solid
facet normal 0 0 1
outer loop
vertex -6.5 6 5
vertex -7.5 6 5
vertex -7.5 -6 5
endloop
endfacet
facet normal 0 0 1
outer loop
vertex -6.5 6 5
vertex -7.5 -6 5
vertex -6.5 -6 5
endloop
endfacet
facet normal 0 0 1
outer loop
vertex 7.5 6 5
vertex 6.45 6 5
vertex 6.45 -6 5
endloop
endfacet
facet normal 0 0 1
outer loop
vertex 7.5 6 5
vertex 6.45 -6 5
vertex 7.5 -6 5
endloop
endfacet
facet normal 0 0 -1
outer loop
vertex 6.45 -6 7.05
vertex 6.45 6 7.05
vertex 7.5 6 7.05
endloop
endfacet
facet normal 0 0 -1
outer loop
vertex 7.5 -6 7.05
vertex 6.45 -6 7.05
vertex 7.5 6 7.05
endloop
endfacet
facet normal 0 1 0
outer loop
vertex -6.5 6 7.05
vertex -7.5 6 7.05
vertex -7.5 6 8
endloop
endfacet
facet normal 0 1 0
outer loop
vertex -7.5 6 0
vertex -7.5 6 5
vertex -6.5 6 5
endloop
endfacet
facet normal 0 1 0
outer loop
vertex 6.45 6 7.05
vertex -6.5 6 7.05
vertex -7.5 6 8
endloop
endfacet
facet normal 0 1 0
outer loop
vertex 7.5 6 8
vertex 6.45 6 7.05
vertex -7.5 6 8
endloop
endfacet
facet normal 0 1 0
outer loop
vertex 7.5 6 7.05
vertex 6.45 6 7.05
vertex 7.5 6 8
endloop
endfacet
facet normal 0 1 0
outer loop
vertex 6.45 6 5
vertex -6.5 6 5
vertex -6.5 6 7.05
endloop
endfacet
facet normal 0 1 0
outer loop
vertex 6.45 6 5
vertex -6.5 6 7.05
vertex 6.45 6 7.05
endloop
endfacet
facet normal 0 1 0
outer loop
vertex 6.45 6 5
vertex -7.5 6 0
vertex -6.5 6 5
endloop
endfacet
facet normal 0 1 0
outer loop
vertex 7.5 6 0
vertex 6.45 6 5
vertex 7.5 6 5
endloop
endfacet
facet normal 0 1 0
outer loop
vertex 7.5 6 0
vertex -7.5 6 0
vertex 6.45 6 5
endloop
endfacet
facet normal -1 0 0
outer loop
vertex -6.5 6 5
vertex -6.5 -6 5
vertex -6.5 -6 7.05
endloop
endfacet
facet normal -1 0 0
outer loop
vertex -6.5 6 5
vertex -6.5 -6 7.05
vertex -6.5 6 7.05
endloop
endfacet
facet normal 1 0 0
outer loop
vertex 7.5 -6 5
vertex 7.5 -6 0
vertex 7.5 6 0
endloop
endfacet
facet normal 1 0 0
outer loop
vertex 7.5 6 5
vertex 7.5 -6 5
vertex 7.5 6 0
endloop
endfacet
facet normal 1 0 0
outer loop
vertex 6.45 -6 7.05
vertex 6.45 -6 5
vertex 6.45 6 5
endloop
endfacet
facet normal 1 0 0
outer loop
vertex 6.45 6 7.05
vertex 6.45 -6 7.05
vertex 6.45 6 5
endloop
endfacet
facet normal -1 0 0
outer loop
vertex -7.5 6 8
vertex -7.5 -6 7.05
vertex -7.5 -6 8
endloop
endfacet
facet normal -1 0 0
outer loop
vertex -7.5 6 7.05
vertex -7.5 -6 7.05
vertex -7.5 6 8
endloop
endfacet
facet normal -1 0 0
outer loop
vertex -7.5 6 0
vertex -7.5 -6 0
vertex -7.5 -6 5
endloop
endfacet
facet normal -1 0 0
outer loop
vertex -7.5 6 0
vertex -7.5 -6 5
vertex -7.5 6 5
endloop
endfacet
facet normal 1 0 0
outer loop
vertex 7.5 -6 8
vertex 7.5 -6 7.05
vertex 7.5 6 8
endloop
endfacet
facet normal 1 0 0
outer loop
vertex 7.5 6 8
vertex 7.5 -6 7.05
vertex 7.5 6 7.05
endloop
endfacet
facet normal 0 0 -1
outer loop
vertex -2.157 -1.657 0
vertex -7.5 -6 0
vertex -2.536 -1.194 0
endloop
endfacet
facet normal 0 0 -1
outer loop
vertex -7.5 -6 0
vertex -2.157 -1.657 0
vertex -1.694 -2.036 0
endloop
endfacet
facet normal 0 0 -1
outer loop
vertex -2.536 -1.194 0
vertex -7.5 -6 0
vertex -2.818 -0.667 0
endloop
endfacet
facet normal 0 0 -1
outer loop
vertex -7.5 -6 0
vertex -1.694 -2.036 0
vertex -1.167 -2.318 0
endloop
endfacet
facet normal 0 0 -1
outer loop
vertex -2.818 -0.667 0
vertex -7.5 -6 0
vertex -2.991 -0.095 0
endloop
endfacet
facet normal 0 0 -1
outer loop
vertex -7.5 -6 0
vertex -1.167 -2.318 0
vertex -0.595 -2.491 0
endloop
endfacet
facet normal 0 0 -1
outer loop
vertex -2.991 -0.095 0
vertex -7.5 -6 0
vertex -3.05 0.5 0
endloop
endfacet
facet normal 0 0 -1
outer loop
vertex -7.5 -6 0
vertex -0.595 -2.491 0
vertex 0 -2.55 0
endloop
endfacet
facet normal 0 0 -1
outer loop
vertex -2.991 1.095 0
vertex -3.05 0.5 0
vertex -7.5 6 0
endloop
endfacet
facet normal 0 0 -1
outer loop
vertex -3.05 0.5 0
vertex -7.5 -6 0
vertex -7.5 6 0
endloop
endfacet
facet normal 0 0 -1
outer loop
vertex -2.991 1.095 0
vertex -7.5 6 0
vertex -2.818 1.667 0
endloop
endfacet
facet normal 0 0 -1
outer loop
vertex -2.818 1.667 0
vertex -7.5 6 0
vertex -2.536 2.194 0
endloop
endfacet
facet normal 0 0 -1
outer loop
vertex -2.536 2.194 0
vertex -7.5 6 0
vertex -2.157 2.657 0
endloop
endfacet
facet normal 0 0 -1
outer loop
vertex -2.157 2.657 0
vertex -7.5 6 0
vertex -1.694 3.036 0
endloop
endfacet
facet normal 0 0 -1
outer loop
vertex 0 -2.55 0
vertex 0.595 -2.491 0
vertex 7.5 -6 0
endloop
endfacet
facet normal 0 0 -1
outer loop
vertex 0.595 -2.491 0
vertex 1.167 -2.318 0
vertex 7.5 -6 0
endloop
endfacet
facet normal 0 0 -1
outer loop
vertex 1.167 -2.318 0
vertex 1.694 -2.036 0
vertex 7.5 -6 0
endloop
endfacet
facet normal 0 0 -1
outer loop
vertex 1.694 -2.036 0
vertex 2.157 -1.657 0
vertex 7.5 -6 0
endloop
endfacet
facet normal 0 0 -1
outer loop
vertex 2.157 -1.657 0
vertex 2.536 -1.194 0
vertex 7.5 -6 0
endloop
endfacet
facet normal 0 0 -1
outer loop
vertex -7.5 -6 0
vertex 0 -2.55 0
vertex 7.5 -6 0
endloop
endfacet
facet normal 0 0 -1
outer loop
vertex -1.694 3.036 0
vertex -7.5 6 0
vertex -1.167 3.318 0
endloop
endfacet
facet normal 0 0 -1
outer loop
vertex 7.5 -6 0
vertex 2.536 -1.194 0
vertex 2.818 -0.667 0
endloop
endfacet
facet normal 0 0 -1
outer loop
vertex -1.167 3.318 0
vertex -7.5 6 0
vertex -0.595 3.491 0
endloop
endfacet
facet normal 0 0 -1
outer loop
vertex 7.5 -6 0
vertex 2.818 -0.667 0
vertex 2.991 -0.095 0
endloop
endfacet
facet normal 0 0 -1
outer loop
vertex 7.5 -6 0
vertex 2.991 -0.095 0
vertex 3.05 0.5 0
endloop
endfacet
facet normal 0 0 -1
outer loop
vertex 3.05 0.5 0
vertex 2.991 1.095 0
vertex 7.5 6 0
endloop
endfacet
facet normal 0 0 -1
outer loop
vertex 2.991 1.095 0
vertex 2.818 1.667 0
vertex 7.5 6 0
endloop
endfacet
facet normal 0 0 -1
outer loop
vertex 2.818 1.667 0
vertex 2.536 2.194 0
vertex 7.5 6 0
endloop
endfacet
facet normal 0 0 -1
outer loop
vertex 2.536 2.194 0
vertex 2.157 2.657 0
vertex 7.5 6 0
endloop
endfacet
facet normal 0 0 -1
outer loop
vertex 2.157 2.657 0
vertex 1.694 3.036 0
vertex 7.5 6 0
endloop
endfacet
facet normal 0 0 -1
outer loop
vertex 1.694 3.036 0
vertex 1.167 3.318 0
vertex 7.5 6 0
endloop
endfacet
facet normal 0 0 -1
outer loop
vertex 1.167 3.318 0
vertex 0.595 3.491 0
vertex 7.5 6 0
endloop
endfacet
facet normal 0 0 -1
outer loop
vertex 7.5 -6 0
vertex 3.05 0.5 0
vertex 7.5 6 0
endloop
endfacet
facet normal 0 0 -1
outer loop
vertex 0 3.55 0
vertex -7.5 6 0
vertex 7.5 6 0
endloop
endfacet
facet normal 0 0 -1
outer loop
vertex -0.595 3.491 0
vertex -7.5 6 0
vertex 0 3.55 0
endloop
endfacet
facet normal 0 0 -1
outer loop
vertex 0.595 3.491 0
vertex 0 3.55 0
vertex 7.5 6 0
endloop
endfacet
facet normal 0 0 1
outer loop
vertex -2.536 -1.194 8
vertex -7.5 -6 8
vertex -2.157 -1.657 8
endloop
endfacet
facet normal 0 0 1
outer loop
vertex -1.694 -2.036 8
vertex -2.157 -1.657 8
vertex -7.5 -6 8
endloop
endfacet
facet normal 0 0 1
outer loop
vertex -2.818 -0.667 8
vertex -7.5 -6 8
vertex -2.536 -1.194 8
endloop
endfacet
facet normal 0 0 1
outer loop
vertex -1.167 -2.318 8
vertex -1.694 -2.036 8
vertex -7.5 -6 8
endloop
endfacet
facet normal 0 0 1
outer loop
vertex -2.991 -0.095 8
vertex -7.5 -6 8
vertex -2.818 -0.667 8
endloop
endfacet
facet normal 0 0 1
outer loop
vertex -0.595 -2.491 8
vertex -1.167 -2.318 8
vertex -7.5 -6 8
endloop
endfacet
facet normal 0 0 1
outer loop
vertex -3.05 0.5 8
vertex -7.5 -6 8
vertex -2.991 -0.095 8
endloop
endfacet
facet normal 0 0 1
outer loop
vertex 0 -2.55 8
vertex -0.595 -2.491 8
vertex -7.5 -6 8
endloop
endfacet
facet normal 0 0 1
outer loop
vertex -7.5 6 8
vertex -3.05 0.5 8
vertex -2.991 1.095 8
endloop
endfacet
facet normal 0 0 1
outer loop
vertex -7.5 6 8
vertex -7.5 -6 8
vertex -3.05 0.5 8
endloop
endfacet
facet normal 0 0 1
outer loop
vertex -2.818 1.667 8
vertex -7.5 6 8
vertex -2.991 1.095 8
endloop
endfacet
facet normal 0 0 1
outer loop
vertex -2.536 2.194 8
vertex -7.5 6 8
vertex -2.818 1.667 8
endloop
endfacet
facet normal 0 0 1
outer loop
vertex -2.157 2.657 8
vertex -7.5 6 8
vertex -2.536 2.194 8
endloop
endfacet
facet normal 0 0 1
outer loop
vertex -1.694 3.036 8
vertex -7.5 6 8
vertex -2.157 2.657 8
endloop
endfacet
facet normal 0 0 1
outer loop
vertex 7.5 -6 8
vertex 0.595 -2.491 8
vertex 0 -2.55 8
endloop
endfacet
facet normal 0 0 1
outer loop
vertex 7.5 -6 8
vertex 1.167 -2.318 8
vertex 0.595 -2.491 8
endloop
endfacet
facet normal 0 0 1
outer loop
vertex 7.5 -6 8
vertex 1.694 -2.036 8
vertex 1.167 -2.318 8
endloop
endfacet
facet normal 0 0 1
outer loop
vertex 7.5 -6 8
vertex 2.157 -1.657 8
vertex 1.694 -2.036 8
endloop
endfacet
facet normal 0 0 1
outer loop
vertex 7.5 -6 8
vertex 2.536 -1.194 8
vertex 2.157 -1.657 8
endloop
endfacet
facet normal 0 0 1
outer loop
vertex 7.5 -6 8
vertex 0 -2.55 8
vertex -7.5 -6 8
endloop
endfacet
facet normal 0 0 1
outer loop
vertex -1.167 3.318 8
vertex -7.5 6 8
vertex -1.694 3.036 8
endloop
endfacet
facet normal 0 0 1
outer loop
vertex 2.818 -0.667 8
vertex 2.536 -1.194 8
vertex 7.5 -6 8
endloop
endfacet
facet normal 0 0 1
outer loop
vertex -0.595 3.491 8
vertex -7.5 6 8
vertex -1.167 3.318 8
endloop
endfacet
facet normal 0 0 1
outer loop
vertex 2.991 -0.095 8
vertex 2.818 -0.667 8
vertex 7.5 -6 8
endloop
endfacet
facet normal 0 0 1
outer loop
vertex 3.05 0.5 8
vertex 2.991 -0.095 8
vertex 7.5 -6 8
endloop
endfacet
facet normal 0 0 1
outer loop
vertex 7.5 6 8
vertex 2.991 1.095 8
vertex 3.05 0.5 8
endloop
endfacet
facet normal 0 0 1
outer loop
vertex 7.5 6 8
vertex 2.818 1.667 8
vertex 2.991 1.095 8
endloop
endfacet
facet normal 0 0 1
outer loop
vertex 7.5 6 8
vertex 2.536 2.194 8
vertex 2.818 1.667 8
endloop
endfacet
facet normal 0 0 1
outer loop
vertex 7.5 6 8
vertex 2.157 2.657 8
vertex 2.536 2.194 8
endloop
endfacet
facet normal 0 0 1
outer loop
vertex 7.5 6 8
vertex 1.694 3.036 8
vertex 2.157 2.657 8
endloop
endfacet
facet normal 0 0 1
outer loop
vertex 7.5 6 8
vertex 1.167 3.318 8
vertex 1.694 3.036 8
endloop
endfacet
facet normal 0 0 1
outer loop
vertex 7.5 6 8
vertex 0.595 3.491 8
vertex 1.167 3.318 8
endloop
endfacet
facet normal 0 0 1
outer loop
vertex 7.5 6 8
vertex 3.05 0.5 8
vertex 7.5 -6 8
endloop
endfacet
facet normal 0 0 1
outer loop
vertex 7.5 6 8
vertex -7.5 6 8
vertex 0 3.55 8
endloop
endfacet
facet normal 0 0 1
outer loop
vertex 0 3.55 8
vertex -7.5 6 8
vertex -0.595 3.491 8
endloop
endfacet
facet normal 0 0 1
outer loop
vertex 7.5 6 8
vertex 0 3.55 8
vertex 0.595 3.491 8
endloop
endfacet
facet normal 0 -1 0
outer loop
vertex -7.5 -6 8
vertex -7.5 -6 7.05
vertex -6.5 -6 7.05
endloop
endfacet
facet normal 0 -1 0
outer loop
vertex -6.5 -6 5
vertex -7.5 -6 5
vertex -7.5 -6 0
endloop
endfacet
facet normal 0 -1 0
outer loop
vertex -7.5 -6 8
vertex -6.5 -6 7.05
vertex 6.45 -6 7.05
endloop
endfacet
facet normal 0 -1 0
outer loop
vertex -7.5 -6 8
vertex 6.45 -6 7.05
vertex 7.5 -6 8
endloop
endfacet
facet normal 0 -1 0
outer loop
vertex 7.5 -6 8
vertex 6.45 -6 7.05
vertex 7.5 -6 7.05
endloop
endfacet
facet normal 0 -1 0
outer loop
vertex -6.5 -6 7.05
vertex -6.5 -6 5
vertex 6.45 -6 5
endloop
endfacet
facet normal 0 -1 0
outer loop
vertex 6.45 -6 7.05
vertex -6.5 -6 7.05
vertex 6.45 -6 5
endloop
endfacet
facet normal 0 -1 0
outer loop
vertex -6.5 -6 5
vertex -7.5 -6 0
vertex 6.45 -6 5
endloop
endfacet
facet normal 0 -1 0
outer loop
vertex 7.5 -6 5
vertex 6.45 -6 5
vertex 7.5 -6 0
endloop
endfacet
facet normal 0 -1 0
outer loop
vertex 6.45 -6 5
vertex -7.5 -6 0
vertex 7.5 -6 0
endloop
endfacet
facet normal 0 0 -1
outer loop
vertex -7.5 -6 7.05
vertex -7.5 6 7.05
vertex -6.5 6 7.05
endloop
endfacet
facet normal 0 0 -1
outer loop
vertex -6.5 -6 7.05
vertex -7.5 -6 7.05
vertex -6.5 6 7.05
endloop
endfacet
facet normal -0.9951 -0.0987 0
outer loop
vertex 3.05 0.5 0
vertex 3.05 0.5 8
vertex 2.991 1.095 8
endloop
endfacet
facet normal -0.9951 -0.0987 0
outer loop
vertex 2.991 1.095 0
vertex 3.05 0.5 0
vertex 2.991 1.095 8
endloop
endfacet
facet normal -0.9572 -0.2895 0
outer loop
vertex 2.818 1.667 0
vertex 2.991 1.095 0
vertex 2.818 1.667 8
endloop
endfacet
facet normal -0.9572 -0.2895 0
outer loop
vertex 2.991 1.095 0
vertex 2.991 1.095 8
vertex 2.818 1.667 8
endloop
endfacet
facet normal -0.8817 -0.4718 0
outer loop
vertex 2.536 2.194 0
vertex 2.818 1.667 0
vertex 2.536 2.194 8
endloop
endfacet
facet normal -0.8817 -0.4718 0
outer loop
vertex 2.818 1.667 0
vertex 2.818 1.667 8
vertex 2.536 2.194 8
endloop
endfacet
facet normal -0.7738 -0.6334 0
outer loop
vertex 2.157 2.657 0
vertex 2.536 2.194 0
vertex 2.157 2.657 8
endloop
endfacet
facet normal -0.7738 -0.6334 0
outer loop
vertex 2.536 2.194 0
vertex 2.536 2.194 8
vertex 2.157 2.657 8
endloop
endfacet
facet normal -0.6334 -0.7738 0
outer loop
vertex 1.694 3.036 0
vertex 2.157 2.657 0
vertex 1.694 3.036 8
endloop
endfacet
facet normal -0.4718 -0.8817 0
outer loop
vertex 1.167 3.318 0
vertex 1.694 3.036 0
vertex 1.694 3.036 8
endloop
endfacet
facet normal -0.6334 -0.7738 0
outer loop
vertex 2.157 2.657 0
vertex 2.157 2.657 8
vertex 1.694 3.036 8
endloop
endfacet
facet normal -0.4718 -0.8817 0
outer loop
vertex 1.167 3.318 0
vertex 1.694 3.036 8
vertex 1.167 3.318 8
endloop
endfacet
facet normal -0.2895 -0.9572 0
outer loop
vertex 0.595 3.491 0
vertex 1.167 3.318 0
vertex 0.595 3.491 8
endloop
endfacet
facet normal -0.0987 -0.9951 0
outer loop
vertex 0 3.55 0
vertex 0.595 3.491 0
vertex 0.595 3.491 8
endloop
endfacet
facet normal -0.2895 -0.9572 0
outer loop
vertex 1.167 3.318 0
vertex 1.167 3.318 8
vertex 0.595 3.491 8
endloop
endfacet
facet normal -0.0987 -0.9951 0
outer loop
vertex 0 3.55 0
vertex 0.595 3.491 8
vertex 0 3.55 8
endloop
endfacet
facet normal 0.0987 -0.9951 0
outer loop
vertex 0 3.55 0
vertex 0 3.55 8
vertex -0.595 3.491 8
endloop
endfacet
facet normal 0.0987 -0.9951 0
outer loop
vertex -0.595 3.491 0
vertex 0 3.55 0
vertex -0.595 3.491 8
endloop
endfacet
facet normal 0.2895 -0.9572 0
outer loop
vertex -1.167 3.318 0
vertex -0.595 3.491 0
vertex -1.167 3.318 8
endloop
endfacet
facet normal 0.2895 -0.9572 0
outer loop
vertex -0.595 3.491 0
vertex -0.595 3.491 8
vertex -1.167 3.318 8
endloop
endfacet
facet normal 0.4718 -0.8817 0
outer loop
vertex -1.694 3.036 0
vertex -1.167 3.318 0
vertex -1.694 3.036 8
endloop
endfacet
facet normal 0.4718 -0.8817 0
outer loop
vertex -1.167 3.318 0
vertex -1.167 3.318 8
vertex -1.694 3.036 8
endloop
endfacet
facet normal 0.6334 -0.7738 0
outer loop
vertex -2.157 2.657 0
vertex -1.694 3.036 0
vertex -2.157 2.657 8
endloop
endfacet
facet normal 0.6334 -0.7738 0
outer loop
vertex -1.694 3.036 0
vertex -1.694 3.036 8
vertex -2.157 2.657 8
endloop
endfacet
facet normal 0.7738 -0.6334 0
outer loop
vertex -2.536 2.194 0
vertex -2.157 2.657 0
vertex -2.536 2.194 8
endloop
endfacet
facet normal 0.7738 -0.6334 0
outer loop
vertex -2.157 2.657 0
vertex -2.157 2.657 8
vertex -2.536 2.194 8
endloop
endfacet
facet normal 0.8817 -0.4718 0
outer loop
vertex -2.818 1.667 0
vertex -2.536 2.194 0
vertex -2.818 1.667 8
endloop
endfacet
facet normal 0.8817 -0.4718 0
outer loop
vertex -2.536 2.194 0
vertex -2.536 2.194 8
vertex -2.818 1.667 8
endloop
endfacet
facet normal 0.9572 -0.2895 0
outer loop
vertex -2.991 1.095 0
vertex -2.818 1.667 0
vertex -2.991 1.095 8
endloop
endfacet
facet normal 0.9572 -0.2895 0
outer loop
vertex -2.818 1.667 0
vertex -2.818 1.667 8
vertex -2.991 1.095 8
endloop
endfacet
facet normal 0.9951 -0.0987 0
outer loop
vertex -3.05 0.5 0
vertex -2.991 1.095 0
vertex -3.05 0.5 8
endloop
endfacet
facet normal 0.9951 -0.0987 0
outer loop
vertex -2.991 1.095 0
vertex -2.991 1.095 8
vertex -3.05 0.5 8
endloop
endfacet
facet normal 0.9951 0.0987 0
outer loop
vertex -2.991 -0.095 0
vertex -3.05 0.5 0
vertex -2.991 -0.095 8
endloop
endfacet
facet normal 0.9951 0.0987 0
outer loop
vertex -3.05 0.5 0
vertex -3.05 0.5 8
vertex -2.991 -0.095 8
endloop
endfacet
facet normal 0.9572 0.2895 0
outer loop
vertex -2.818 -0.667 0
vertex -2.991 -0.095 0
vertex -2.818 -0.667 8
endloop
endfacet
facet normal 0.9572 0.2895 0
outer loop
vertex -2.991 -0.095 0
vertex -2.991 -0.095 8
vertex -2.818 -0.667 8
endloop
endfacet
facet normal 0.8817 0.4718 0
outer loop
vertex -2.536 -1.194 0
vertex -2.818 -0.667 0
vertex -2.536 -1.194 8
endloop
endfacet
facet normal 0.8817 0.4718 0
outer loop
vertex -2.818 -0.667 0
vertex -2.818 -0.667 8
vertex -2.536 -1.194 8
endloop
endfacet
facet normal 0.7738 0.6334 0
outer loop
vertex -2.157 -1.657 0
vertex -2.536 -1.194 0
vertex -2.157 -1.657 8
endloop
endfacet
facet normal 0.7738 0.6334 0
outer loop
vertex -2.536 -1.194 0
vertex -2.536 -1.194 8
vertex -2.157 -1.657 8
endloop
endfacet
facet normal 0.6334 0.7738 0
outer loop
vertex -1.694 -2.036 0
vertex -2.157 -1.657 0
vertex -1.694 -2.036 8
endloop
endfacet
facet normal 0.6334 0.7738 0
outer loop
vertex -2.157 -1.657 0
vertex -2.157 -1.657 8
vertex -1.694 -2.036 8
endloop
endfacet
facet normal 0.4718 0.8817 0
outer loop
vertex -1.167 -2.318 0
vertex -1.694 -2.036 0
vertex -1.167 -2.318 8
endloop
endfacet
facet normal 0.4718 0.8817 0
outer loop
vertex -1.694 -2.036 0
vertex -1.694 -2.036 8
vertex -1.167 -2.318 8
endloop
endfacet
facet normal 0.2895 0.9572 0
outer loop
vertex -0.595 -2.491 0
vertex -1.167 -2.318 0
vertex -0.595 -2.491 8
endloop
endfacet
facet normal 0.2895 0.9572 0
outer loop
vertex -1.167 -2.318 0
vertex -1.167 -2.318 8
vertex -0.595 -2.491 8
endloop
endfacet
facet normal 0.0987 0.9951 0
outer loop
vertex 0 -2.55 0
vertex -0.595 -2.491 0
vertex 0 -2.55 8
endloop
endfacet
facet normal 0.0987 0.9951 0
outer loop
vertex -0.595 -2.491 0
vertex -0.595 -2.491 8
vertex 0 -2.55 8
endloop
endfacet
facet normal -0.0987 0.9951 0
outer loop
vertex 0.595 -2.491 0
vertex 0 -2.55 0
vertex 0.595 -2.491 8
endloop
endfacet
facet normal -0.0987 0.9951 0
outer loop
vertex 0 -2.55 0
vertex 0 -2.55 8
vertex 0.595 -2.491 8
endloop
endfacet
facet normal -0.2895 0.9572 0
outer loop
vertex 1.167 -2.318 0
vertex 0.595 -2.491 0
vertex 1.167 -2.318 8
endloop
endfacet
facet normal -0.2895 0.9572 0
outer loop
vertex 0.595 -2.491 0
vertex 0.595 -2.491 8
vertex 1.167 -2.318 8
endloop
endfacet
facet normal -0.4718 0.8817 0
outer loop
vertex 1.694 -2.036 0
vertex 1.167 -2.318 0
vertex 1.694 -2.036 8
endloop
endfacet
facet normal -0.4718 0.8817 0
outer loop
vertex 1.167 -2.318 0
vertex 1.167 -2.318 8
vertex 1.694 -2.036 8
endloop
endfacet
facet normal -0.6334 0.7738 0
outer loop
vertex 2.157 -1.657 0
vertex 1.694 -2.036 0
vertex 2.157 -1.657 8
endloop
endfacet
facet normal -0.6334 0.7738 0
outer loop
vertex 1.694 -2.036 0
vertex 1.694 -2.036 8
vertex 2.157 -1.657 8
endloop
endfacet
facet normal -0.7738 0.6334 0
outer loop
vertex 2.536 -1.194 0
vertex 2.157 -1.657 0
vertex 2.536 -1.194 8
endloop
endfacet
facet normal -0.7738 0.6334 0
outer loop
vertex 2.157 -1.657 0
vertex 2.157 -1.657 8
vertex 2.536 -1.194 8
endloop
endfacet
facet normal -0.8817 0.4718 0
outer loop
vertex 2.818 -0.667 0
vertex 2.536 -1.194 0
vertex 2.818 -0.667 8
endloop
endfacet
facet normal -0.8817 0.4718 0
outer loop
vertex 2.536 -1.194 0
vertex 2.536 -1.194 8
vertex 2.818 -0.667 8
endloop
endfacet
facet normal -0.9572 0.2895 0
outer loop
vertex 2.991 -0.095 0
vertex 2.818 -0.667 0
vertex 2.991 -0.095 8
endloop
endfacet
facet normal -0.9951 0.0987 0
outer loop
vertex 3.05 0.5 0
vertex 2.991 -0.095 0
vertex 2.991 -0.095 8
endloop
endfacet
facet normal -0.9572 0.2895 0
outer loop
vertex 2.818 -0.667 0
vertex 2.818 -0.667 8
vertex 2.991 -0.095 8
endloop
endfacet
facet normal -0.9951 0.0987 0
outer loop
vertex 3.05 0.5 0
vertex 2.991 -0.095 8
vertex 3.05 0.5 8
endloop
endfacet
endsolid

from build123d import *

# Parameters (mm, degrees)
ESQUISSE1_W             = 15
ESQUISSE1_H             = 12
BOSS_EXTRU_1_DEPTH      = 5
ESQUISSE2_W             = 12.95
ESQUISSE2_H             = 12
BOSS_EXTRU_2_DEPTH      = 2.05
ESQUISSE3_W             = 15
ESQUISSE3_H             = 12
BOSS_EXTRU_3_DEPTH      = 0.95
ESQUISSE4_R             = 3.05
ENL_V_MAT_EXTRU_1_DEPTH = 8


with BuildPart() as part:
    # Esquisse1 → Boss.-Extru.1 (new body)
    with BuildSketch(Plane.XY):
        Rectangle(ESQUISSE1_W, ESQUISSE1_H)
    extrude(amount=BOSS_EXTRU_1_DEPTH)

    # Esquisse2 → Boss.-Extru.2 (add)
    with BuildSketch(Plane.XY.offset(5)):
        with Locations((-0.025, 0)):
            Rectangle(ESQUISSE2_W, ESQUISSE2_H)
    extrude(amount=BOSS_EXTRU_2_DEPTH)

    # Esquisse3 → Boss.-Extru.3 (add)
    with BuildSketch(Plane.XY.offset(7.05)):
        Rectangle(ESQUISSE3_W, ESQUISSE3_H)
    extrude(amount=BOSS_EXTRU_3_DEPTH)

    # Esquisse4 → Enlèv. mat.-Extru.1 (cut)
    with BuildSketch(Plane.XY.offset(8)):
        with Locations((0, 0.5)):
            Circle(ESQUISSE4_R)
    extrude(amount=-ENL_V_MAT_EXTRU_1_DEPTH, mode=Mode.SUBTRACT)


solid = part.part
